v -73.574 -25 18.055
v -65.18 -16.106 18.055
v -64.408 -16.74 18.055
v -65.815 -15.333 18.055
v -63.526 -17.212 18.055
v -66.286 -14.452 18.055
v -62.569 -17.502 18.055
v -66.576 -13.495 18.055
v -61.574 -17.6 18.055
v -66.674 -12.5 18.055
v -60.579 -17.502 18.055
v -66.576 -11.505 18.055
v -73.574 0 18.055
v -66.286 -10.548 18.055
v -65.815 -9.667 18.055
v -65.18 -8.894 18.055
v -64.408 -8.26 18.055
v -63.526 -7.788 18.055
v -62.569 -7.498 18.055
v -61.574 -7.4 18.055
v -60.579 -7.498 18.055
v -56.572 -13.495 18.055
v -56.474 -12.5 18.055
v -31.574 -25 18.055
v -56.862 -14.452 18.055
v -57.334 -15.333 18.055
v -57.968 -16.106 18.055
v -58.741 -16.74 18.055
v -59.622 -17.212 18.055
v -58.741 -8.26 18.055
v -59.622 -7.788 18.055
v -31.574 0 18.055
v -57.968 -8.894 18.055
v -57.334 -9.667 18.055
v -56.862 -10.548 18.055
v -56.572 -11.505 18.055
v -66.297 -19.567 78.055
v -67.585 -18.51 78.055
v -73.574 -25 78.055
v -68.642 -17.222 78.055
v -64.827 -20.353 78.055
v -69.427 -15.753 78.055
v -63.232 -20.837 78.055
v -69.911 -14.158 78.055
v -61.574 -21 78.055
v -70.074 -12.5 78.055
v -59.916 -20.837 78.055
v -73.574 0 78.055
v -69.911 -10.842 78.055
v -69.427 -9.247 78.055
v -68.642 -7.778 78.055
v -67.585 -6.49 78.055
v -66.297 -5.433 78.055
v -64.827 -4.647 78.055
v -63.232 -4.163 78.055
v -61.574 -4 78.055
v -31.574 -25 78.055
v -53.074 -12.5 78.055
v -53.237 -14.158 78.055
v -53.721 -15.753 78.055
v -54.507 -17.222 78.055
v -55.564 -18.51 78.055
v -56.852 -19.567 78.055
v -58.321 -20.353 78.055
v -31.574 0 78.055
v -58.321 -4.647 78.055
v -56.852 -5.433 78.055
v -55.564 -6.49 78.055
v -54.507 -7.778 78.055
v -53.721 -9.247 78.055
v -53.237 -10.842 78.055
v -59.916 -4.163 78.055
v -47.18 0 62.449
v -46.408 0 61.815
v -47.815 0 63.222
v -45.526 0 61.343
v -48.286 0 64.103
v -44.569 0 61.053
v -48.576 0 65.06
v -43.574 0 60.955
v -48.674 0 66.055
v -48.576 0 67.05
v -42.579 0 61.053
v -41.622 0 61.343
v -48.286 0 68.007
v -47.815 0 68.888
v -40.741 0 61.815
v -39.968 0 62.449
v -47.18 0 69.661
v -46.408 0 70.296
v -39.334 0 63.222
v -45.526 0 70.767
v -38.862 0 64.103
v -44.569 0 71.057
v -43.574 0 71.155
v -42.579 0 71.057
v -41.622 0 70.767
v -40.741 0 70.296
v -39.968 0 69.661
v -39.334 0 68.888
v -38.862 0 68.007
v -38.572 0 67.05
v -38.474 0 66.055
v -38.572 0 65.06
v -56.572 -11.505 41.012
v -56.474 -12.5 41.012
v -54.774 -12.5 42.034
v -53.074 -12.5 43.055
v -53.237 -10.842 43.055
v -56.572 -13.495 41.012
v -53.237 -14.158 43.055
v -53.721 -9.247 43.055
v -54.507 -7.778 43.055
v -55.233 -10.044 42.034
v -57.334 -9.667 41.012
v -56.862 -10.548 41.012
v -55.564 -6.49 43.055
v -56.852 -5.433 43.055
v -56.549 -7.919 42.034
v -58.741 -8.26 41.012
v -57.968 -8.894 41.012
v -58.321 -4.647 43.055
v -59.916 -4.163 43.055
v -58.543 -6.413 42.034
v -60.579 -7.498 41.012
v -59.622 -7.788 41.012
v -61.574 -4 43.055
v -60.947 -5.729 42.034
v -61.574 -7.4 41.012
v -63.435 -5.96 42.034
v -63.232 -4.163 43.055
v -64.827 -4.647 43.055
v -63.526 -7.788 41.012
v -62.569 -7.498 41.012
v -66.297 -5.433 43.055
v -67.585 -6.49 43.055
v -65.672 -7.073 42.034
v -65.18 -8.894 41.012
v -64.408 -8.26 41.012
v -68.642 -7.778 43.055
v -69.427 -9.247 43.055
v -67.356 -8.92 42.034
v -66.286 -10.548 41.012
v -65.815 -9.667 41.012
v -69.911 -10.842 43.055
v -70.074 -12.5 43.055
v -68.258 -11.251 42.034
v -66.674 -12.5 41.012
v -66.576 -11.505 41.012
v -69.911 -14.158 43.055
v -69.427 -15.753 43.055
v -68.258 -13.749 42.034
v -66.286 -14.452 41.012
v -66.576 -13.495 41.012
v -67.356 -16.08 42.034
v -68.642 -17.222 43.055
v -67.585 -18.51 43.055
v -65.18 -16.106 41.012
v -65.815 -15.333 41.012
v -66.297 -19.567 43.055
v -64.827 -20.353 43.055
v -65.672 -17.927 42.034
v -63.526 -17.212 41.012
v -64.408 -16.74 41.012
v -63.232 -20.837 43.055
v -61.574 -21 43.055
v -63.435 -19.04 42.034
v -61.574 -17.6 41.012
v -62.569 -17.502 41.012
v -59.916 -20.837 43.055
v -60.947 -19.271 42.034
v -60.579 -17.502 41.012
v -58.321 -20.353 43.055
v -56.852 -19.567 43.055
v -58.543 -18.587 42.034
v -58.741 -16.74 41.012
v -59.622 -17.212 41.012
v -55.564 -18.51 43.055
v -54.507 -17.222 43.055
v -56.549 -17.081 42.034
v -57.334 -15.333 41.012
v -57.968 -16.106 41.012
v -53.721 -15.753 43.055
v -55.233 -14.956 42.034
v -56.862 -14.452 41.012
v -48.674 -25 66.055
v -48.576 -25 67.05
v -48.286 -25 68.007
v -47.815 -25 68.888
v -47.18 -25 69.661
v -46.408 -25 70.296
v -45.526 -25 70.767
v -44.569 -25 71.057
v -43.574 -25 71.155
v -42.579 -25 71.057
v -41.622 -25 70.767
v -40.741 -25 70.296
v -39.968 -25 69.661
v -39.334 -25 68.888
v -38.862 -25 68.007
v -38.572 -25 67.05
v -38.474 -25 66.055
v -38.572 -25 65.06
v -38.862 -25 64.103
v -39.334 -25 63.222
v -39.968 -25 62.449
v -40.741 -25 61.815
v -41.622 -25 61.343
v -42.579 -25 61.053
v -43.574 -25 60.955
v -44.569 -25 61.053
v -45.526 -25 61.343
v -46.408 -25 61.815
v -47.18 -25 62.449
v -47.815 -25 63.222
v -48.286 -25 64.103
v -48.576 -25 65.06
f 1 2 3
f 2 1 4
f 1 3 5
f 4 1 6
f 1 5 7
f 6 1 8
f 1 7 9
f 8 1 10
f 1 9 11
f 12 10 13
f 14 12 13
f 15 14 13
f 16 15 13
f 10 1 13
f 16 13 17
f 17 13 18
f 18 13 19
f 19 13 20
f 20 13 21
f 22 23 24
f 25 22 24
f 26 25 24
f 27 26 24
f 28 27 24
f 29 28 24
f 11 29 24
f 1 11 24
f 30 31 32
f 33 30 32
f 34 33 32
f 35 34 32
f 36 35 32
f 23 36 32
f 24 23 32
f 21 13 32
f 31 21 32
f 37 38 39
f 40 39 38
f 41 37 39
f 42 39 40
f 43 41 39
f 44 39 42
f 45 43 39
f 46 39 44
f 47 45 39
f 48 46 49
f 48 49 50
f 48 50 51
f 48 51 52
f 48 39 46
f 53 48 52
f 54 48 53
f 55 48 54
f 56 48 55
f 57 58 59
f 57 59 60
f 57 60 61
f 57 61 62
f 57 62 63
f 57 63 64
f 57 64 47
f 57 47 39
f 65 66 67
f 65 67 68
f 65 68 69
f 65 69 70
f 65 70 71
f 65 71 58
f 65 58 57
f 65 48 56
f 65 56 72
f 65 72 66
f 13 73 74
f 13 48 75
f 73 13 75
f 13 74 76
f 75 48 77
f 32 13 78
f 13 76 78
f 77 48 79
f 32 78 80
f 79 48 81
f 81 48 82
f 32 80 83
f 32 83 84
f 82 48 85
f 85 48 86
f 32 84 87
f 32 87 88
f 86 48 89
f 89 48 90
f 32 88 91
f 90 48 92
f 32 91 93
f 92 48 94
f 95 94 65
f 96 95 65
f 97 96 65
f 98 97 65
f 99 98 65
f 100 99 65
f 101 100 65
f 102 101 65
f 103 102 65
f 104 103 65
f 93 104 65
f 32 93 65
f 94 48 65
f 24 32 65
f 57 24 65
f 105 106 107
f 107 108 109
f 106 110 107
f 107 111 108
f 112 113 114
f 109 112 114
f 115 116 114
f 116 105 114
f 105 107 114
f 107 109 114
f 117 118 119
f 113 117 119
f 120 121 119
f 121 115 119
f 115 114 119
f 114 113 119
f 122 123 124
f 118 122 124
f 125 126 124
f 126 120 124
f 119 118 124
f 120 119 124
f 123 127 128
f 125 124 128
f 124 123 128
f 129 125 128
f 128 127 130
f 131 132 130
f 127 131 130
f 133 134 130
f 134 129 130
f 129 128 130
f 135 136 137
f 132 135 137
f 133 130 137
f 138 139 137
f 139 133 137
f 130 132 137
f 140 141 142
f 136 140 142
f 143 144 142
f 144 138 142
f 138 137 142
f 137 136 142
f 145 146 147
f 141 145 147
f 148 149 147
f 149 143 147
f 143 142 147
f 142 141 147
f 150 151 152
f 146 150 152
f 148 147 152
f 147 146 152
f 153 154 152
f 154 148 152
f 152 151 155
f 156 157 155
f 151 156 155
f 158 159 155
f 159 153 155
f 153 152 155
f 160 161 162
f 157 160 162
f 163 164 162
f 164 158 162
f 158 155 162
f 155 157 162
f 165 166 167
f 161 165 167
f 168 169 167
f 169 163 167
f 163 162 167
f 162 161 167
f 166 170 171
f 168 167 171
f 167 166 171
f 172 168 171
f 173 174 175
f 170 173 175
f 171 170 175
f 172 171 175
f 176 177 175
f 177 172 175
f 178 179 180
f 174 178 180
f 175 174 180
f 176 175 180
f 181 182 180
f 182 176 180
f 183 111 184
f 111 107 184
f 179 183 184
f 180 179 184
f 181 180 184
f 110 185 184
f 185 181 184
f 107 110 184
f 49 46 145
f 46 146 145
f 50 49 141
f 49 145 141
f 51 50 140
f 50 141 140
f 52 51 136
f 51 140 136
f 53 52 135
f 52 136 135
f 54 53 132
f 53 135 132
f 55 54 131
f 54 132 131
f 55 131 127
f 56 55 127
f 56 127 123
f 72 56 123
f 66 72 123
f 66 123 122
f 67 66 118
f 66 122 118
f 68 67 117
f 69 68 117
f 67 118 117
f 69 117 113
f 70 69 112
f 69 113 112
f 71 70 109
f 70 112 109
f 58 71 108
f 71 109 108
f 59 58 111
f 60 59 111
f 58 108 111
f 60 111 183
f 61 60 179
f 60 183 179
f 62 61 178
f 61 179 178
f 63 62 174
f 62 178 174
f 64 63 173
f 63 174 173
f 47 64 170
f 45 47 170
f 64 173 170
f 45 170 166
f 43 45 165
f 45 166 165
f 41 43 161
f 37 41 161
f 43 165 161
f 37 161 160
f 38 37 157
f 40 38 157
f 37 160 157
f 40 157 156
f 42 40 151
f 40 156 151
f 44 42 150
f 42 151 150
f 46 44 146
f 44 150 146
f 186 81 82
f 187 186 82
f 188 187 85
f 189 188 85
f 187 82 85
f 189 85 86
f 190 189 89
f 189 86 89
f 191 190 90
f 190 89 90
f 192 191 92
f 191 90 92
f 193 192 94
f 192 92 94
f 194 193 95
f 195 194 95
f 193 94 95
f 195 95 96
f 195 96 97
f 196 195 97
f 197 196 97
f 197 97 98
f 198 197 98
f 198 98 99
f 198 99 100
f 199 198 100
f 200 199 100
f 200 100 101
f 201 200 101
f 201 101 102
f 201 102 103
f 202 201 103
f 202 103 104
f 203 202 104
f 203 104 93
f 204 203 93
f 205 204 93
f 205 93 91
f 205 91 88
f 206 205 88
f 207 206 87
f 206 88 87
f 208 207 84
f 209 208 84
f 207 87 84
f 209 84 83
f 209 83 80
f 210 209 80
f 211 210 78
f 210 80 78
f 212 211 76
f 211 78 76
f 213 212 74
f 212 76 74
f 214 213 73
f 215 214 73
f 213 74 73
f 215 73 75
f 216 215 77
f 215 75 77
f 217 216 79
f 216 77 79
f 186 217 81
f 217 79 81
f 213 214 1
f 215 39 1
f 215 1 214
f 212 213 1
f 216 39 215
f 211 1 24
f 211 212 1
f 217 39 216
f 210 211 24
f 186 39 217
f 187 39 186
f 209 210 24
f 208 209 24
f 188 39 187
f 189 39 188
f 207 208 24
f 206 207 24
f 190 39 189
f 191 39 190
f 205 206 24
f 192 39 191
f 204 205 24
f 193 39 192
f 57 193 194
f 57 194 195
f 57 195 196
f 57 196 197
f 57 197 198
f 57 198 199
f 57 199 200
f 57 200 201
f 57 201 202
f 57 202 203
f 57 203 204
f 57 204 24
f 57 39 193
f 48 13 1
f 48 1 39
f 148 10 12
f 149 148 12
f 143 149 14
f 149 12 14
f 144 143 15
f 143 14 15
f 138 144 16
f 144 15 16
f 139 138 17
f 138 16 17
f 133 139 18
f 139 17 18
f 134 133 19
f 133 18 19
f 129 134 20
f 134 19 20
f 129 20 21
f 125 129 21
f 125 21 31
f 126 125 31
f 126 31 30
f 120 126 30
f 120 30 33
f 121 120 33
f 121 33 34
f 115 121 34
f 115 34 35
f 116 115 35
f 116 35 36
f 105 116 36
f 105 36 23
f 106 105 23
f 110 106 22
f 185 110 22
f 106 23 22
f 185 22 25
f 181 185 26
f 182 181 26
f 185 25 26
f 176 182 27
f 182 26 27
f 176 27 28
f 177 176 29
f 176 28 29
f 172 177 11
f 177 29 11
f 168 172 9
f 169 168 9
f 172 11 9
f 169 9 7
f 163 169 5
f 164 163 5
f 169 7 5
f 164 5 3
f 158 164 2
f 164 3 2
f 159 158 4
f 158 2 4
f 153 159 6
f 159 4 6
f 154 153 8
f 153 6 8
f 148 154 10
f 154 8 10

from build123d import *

# Parameters (mm, degrees)
F0_W     = 42
F0_H     = 60
F1_DEPTH = 25
F4_D     = 10.2
F4_DEPTH = 100
F4_TIP   = 3.064389157
F5_D     = 10.2
F5_DEPTH = 100
F5_TIP   = 3.064389157
F6_D     = 17
F6_DEPTH = 35
F6_TIP   = 5.1073152617


with BuildPart() as f1:
    # F0 (on Front) → F1 (new body)
    with BuildSketch(Plane.XZ):
        with Locations((-52.5741710365, 48.0550478399)):
            Rectangle(F0_W, F0_H)
    extrude(amount=F1_DEPTH)

    # F4
    with Locations(Plane.XZ.offset(25)):
        with Locations((-43.5741710365, 66.0550478399)):
            Hole(F4_D / 2, depth=F4_DEPTH)
            with Locations((0, 0, -(F4_DEPTH + F4_TIP / 2))):  # 118° drill point
                Cone(0, F4_D / 2, F4_TIP, mode=Mode.SUBTRACT)

    # F5
    with Locations(Plane.XY.offset(78.0550478399)):
        with Locations((-61.5741710365, -12.5)):
            Hole(F5_D / 2, depth=F5_DEPTH)
            with Locations((0, 0, -(F5_DEPTH + F5_TIP / 2))):  # 118° drill point
                Cone(0, F5_D / 2, F5_TIP, mode=Mode.SUBTRACT)

    # F6
    with Locations(Plane.XY.offset(78.0550478399)):
        with Locations((-61.5741710365, -12.5)):
            Hole(F6_D / 2, depth=F6_DEPTH)
            with Locations((0, 0, -(F6_DEPTH + F6_TIP / 2))):  # 118° drill point
                Cone(0, F6_D / 2, F6_TIP, mode=Mode.SUBTRACT)


solid = f1.part
